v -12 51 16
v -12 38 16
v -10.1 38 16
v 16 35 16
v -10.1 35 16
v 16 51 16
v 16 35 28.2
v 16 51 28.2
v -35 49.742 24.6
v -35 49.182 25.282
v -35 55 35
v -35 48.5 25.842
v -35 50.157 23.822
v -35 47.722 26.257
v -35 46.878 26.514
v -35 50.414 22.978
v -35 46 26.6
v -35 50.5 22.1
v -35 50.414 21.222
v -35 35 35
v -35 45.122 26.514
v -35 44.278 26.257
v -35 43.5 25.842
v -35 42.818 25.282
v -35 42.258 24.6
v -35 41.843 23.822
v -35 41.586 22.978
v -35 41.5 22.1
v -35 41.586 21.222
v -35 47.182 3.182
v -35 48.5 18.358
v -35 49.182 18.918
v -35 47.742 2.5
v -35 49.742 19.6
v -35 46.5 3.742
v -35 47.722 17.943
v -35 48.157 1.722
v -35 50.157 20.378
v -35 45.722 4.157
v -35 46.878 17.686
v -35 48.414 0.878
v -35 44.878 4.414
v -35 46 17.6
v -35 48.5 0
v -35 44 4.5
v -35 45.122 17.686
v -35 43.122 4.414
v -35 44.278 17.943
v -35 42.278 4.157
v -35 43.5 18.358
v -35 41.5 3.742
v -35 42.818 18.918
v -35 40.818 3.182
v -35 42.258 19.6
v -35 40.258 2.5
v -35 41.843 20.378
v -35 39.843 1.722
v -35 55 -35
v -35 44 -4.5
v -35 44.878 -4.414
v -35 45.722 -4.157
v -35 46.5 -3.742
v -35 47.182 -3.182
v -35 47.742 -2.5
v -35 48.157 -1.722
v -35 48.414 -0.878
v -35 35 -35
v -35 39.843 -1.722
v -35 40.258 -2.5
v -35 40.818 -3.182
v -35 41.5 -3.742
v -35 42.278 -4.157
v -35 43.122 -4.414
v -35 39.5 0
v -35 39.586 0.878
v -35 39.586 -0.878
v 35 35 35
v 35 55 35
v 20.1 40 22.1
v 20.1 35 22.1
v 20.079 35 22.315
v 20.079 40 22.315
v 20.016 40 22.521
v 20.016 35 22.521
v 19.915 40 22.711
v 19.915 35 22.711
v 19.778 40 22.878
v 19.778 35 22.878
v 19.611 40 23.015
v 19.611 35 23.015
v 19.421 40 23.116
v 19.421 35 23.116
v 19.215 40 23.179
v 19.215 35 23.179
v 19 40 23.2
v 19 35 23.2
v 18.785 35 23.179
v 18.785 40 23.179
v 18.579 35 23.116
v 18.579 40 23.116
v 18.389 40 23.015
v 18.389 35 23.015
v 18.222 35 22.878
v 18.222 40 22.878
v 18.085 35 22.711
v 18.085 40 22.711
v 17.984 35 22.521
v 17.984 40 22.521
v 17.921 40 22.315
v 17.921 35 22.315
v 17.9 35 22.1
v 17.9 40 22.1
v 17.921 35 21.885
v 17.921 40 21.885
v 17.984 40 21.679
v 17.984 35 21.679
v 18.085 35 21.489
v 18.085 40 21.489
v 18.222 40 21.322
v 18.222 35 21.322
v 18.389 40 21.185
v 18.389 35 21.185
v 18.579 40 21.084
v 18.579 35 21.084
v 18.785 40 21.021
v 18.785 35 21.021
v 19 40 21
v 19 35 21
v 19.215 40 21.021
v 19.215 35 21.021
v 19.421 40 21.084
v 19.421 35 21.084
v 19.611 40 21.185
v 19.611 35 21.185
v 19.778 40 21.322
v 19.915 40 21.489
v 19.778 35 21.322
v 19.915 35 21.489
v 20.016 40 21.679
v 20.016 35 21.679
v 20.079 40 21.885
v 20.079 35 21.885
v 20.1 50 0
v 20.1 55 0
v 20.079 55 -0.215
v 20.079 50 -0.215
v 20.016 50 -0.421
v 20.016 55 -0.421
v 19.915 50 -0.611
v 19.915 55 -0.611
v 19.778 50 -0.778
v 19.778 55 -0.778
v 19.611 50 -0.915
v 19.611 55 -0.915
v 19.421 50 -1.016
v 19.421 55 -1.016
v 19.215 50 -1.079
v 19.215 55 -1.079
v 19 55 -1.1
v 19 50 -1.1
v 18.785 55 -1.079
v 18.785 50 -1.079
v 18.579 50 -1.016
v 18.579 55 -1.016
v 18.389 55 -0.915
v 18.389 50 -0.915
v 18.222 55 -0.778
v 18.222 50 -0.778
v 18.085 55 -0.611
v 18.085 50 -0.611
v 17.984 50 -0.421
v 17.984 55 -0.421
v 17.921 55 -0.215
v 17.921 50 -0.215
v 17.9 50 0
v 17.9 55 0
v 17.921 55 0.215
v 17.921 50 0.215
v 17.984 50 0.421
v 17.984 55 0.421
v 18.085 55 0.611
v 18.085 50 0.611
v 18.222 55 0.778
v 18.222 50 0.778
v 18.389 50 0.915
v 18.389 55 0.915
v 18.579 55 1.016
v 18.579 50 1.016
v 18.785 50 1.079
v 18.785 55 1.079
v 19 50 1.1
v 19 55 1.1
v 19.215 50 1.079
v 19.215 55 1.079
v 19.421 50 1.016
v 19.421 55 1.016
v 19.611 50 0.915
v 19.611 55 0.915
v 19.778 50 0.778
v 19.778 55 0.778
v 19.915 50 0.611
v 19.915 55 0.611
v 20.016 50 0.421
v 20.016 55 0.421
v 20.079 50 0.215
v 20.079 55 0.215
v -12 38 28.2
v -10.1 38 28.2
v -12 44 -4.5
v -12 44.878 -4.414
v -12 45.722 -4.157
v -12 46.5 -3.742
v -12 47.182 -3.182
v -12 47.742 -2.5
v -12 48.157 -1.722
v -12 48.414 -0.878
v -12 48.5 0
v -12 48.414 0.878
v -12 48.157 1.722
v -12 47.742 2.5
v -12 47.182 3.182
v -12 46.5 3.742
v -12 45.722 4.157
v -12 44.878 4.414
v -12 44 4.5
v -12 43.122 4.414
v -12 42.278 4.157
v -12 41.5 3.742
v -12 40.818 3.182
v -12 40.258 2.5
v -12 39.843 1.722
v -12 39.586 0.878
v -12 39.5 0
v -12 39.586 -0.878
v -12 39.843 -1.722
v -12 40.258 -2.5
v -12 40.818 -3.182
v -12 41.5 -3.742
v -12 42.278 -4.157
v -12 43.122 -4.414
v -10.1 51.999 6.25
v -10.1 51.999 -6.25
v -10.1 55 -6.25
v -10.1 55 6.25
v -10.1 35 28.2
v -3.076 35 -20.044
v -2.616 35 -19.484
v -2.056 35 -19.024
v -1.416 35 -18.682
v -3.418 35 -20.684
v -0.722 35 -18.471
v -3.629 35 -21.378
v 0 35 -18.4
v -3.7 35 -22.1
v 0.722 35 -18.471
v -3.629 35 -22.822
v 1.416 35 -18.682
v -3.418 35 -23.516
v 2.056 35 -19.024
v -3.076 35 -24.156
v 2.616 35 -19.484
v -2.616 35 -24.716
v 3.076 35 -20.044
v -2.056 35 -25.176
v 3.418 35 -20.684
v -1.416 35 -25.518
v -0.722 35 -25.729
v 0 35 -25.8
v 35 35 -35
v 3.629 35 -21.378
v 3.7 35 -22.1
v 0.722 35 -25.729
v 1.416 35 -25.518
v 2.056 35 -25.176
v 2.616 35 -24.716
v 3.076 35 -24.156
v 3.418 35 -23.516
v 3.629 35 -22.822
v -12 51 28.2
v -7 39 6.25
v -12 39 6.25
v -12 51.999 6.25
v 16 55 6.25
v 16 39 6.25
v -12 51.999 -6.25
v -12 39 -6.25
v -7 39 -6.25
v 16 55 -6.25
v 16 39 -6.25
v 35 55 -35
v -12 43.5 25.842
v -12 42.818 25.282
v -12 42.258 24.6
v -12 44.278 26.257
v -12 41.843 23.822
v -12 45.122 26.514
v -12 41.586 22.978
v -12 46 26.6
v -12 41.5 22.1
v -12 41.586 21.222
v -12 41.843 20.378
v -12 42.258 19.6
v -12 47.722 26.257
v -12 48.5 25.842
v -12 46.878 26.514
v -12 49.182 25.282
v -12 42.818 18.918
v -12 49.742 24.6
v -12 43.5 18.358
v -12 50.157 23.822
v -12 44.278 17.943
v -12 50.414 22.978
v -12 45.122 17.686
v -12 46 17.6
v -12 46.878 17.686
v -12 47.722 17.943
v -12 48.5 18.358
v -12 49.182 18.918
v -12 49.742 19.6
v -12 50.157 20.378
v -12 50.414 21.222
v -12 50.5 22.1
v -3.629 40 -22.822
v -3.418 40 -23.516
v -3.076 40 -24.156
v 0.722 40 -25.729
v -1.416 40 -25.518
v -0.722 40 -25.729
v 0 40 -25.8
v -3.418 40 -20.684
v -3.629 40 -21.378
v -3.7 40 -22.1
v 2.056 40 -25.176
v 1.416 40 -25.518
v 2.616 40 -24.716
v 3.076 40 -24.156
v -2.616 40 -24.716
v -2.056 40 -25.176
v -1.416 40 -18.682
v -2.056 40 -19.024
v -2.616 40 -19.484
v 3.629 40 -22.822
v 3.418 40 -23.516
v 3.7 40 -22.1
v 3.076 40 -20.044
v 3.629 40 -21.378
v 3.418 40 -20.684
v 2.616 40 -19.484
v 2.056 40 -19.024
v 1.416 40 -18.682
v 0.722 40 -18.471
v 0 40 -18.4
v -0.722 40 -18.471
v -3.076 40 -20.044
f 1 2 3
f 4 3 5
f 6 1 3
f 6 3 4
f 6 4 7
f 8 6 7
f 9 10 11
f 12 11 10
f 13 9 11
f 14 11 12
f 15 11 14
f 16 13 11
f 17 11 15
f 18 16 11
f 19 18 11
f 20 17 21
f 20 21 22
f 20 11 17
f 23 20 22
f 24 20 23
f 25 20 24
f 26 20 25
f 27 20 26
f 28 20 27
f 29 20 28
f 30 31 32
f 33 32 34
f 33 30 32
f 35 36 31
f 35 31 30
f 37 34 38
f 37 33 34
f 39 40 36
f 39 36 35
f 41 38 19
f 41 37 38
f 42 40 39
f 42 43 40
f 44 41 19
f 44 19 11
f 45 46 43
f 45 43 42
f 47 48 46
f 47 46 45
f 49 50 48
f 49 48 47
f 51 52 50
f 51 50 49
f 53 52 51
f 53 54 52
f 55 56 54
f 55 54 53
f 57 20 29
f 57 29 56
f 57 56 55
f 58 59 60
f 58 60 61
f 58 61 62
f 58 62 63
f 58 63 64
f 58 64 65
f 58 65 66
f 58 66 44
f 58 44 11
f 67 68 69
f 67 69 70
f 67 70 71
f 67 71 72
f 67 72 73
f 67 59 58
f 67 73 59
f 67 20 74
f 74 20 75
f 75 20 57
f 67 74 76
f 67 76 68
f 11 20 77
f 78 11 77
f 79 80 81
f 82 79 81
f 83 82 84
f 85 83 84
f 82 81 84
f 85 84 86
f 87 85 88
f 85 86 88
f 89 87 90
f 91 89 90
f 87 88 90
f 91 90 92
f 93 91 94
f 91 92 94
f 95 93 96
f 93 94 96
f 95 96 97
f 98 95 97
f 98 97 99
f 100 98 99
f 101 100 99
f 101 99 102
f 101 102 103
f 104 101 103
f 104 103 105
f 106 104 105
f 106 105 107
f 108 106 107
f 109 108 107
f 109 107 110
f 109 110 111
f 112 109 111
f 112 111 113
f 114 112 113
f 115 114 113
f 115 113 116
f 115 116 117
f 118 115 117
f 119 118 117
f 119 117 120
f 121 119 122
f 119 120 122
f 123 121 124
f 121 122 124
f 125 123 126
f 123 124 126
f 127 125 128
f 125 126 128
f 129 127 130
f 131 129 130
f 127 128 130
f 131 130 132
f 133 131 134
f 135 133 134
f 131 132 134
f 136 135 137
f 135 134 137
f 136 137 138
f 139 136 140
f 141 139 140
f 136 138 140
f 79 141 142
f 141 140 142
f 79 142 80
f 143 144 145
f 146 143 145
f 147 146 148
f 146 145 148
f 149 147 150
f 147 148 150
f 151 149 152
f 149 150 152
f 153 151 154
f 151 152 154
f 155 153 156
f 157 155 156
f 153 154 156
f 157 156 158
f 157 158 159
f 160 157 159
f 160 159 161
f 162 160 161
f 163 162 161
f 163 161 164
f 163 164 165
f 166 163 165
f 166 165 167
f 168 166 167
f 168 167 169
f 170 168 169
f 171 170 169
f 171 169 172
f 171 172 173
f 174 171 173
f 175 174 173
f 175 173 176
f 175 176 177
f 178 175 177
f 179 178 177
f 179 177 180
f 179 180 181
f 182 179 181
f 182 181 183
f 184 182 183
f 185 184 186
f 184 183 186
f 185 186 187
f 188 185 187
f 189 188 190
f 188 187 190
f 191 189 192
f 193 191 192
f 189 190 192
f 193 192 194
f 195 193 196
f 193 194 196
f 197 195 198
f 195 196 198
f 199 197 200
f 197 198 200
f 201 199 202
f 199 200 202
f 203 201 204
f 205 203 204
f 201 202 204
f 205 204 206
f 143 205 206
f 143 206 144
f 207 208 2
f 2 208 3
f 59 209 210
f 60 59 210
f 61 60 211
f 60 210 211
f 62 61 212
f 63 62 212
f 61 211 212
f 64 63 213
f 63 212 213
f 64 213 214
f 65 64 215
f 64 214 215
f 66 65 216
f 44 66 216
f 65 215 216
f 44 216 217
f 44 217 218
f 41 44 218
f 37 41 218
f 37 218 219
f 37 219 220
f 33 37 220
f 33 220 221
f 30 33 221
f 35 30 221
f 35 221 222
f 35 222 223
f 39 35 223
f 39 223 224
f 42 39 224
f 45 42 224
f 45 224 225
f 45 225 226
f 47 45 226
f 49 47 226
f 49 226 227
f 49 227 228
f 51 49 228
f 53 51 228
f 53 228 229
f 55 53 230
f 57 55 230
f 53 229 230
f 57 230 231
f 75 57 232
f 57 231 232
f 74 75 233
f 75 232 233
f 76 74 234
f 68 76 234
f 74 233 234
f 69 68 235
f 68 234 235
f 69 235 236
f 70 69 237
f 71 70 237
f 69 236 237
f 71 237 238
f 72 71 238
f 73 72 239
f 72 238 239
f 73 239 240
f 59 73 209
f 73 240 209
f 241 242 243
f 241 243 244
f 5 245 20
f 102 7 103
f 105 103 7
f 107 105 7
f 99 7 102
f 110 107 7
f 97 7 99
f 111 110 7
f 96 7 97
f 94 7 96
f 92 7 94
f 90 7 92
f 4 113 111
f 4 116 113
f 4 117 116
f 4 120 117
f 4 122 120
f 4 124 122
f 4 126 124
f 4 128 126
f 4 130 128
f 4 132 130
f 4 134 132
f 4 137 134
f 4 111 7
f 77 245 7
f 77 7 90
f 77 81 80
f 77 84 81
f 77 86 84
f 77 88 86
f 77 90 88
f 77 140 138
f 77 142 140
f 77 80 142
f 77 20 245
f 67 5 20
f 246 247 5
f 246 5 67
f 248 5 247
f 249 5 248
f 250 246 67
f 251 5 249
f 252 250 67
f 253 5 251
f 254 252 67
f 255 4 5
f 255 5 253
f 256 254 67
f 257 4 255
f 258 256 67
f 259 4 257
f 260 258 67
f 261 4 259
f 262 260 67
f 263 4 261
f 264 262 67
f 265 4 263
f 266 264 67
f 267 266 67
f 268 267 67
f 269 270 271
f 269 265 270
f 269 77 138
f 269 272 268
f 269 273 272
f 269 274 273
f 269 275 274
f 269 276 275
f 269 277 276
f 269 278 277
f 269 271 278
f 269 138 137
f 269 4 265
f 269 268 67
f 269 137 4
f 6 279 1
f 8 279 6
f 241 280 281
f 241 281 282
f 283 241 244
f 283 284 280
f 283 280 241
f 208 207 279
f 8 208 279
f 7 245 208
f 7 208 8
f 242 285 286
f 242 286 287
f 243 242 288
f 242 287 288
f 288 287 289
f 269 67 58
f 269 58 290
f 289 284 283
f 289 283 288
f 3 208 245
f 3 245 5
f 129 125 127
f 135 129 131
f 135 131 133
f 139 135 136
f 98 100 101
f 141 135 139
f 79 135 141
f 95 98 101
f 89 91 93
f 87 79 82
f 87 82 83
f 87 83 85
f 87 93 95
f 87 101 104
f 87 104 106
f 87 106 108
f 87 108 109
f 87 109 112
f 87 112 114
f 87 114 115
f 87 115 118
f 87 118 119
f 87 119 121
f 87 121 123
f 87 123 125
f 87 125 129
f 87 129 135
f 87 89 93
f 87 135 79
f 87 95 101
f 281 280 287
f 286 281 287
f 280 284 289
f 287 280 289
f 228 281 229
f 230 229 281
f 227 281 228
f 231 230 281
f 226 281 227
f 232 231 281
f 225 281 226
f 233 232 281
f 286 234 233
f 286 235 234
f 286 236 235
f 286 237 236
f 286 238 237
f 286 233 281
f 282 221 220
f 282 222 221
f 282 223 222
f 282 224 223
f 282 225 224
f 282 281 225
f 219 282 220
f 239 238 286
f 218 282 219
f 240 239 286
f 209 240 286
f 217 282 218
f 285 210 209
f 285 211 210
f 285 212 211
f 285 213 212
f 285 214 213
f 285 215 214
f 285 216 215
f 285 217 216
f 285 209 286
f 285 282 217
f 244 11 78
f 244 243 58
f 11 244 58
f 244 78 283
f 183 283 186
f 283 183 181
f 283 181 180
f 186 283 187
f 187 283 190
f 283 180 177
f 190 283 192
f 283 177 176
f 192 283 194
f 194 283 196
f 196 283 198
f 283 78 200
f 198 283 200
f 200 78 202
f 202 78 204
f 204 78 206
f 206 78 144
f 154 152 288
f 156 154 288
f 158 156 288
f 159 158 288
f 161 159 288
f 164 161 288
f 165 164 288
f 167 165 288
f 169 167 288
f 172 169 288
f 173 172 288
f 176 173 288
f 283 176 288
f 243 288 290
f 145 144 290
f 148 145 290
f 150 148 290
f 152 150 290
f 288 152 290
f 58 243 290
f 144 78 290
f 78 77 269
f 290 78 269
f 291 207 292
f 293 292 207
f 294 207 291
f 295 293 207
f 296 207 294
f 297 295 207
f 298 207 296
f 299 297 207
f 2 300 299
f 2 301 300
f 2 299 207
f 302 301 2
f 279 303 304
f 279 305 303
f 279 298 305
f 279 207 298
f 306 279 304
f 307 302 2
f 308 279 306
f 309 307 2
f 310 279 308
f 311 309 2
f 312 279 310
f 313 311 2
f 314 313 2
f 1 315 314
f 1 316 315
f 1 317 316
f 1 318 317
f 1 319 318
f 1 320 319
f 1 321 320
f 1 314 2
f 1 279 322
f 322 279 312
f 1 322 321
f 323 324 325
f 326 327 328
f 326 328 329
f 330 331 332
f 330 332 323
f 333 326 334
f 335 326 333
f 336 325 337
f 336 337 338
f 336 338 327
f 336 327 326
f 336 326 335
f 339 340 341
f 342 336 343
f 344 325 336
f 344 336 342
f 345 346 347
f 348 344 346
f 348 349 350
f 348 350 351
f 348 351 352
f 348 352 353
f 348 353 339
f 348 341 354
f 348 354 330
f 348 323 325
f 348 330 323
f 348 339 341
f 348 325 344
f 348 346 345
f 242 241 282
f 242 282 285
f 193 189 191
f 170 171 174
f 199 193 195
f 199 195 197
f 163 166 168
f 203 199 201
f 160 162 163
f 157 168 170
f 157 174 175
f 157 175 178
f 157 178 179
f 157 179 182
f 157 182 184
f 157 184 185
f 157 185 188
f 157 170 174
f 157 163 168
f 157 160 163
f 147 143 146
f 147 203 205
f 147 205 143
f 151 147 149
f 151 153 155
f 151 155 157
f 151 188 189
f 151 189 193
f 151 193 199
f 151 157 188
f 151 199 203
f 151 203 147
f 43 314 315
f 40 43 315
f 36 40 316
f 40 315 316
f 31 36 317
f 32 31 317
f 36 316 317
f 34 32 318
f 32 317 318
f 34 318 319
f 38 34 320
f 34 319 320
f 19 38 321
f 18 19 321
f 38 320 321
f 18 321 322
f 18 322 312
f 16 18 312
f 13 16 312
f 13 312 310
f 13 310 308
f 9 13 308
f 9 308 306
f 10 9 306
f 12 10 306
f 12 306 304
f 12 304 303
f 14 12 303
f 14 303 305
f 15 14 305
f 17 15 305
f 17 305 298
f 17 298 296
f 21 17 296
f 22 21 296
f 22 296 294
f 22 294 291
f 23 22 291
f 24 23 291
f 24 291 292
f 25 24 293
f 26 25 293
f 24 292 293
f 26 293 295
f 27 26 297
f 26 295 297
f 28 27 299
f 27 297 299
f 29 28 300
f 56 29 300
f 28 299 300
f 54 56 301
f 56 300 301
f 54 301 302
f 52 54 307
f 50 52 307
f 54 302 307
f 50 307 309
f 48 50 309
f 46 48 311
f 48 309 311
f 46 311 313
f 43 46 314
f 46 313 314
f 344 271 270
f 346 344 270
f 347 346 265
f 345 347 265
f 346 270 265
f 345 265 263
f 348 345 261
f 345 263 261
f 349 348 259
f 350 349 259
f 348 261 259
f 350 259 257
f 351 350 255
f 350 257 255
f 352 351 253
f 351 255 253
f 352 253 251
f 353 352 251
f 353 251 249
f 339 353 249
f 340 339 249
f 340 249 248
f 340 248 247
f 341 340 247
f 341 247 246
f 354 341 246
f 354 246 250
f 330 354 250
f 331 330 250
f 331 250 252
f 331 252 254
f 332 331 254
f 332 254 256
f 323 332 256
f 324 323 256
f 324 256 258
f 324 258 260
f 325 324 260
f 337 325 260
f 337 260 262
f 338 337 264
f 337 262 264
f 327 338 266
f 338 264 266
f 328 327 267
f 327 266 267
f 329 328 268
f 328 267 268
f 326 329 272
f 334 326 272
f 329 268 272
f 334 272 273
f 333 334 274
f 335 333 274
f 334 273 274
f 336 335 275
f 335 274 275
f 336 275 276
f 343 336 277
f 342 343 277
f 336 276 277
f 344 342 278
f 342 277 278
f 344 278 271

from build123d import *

# Parameters (mm, degrees)
CROQUIS1_W              = 64
CROQUIS1_H              = 64
SALIENTE_EXTRUIR1_DEPTH = 60
CROQUIS2_W              = 70
CROQUIS2_H              = 70
CROQUIS2_W_2            = 64
CROQUIS2_H_2            = 64
SALIENTE_EXTRUIR2_DEPTH = 64
CORTAR_EXTRUIR1_DEPTH   = 21
CROQUIS5_R              = 1.1
CORTAR_EXTRUIR2_DEPTH   = 10
CORTAR_EXTRUIR3_REACH   = 30
CROQUIS10_R             = 4.5
CROQUIS11_W             = 70
CROQUIS11_H             = 70
CORTAR_EXTRUIR4_DEPTH   = 30
CROQUIS12_W             = 23
CROQUIS12_H             = 12.2
CORTAR_EXTRUIR5_DEPTH   = 21
CORTAR_EXTRUIR6_REACH   = 30
CROQUIS13_R             = 4.5
CROQUIS14_R             = 1.1
CORTAR_EXTRUIR7_DEPTH   = 10
CROQUIS15_R             = 3.7
CORTAR_EXTRUIR8_DEPTH   = 10
CROQUIS16_W             = 64
CROQUIS16_H             = 64
CORTAR_EXTRUIR9_DEPTH   = 5
CROQUIS17_W             = 12.5
CROQUIS17_H             = 12.998685397
CORTAR_EXTRUIR10_DEPTH  = 5
CORTAR_EXTRUIR11_REACH  = 72
CROQUIS18_W             = 70
CROQUIS18_H             = 9
CROQUIS18_H_2           = 5.000169364
CORTAR_EXTRUIR13_DEPTH  = 5
CORTAR_EXTRUIR16_REACH  = 5.001
CROQUIS23_W             = 3.1
CROQUIS23_H             = 12.5
CORTAR_EXTRUIR17_REACH  = 5
CROQUIS22_W             = 3.1
CROQUIS22_H             = 12.2


with BuildPart() as part:
    # Croquis1 → Saliente-Extruir1 (new body)
    with BuildSketch(Plane(origin=(0, 0, 0), x_dir=(1, 0, 0), z_dir=(0, 1, 0))):
        Rectangle(CROQUIS1_W, CROQUIS1_H)
    extrude(amount=SALIENTE_EXTRUIR1_DEPTH)

    # Croquis2 → Saliente-Extruir2 (add)
    with BuildSketch(Plane(origin=(0, 0, 0), x_dir=(1, 0, 0), z_dir=(0, 1, 0))):
        Rectangle(CROQUIS2_W, CROQUIS2_H)
        Rectangle(CROQUIS2_W_2, CROQUIS2_H_2, mode=Mode.SUBTRACT)
    extrude(amount=SALIENTE_EXTRUIR2_DEPTH)

    # Croquis4 → Cortar-Extruir1 (cut)
    with BuildSketch(Plane(origin=(0, 60, 0), x_dir=(1, 0, 0), z_dir=(0, 1, 0))):
        Polygon((-7, 6), (-7, -6), (-7, -6.25), (16, -6.25), (16, -6), (16, 6), (16, 6.25), (-7, 6.25), align=None)
    extrude(amount=-CORTAR_EXTRUIR1_DEPTH, mode=Mode.SUBTRACT)

    # Croquis5 → Cortar-Extruir2 (cut)
    with BuildSketch(Plane(origin=(0, 60, 0), x_dir=(1, 0, 0), z_dir=(0, 1, 0))):
        with Locations((19, 0)):
            Circle(CROQUIS5_R)
        with Locations((-9, 0)):
            Circle(CROQUIS5_R)
    extrude(amount=-CORTAR_EXTRUIR2_DEPTH, mode=Mode.SUBTRACT)

    # Croquis10 → Cortar-Extruir3 (cut, up to next)
    with BuildSketch(Plane(origin=(-7, 0, 0), x_dir=(0, 0, -1), z_dir=(1, 0, 0)), mode=Mode.PRIVATE) as cortar_extruir3_sk1:
        with Locations((0, 44)):
            Circle(CROQUIS10_R)
    cortar_extruir3_tool1 = extrude(cortar_extruir3_sk1.sketch, amount=-CORTAR_EXTRUIR3_REACH, mode=Mode.PRIVATE) & part.part
    add(cortar_extruir3_tool1.solids().sort_by_distance((-7, 44, 0))[0], mode=Mode.SUBTRACT)

    # Croquis11 → Cortar-Extruir4 (cut)
    with BuildSketch(Plane.XZ):
        Rectangle(CROQUIS11_W, CROQUIS11_H)
    extrude(amount=-CORTAR_EXTRUIR4_DEPTH, mode=Mode.SUBTRACT)

    # Croquis12 → Cortar-Extruir5 (cut)
    with BuildSketch(Plane.XZ.offset(-30)):
        with Locations((4.5, 22.1)):
            Rectangle(CROQUIS12_W, CROQUIS12_H)
    extrude(amount=-CORTAR_EXTRUIR5_DEPTH, mode=Mode.SUBTRACT)

    # Croquis13 → Cortar-Extruir6 (cut, up to next)
    with BuildSketch(Plane(origin=(-7, 0, 0), x_dir=(0, 0, -1), z_dir=(1, 0, 0)), mode=Mode.PRIVATE) as cortar_extruir6_sk1:
        with Locations((-22.1, 46)):
            Circle(CROQUIS13_R)
    cortar_extruir6_tool1 = extrude(cortar_extruir6_sk1.sketch, amount=-CORTAR_EXTRUIR6_REACH, mode=Mode.PRIVATE) & part.part
    add(cortar_extruir6_tool1.solids().sort_by_distance((-7, 46, 22.1))[0], mode=Mode.SUBTRACT)

    # Croquis14 → Cortar-Extruir7 (cut)
    with BuildSketch(Plane.XZ.offset(-30)):
        with Locations((19, 22.1)):
            Circle(CROQUIS14_R)
        with Locations((-9, 22.1)):
            Circle(CROQUIS14_R)
    extrude(amount=-CORTAR_EXTRUIR7_DEPTH, mode=Mode.SUBTRACT)

    # Croquis15 → Cortar-Extruir8 (cut)
    with BuildSketch(Plane.XZ.offset(-30)):
        with Locations((0, -22.1)):
            Circle(CROQUIS15_R)
    extrude(amount=-CORTAR_EXTRUIR8_DEPTH, mode=Mode.SUBTRACT)

    # Croquis16 → Cortar-Extruir9 (cut)
    with BuildSketch(Plane(origin=(0, 60, 0), x_dir=(1, 0, 0), z_dir=(0, 1, 0))):
        Rectangle(CROQUIS16_W, CROQUIS16_H)
    extrude(amount=-CORTAR_EXTRUIR9_DEPTH, mode=Mode.SUBTRACT)

    # Croquis17 → Cortar-Extruir10 (cut)
    with BuildSketch(Plane(origin=(-7, 0, 0), x_dir=(0, 0, -1), z_dir=(1, 0, 0))):
        with Locations((0, 45.499342699)):
            Rectangle(CROQUIS17_W, CROQUIS17_H)
    extrude(amount=-CORTAR_EXTRUIR10_DEPTH, mode=Mode.SUBTRACT)

    # Croquis18 → Cortar-Extruir11 (cut, up to next)
    with BuildSketch(Plane(origin=(35, 0, 0), x_dir=(0, 0, -1), z_dir=(1, 0, 0)), mode=Mode.PRIVATE) as cortar_extruir11_sk1:
        with Locations((0, 59.5)):
            Rectangle(CROQUIS18_W, CROQUIS18_H)
    cortar_extruir11_tool1 = extrude(cortar_extruir11_sk1.sketch, amount=-CORTAR_EXTRUIR11_REACH, mode=Mode.PRIVATE) & part.part
    add(cortar_extruir11_tool1.solids().sort_by_distance((35, 59.5, 0))[0], mode=Mode.SUBTRACT)
    # Croquis18 → Cortar-Extruir11 (cut, up to next)
    with BuildSketch(Plane(origin=(35, 0, 0), x_dir=(0, 0, -1), z_dir=(1, 0, 0)), mode=Mode.PRIVATE) as cortar_extruir11_sk2:
        with Locations((0, 32.500084682)):
            Rectangle(CROQUIS18_W, CROQUIS18_H_2)
    cortar_extruir11_tool2 = extrude(cortar_extruir11_sk2.sketch, amount=-CORTAR_EXTRUIR11_REACH, mode=Mode.PRIVATE) & part.part
    add(cortar_extruir11_tool2.solids().sort_by_distance((35, 32.500085, 0))[0], mode=Mode.SUBTRACT)

    # Croquis19 → Cortar-Extruir13 (cut)
    with BuildSketch(Plane(origin=(-7, 0, 0), x_dir=(0, 0, -1), z_dir=(1, 0, 0))):
        Polygon((-16, 51), (-28.2, 51), (-28.2, 38.000169364), (-22.1, 38.000169364), (-16, 38.000169364), align=None)
    extrude(amount=-CORTAR_EXTRUIR13_DEPTH, mode=Mode.SUBTRACT)

    # Croquis23 → Cortar-Extruir16 (cut, up to next)
    with BuildSketch(Plane.XZ.offset(-51.998685397), mode=Mode.PRIVATE) as cortar_extruir16_sk1:
        with Locations((-8.55, 0)):
            Rectangle(CROQUIS23_W, CROQUIS23_H)
    cortar_extruir16_tool1 = extrude(cortar_extruir16_sk1.sketch, amount=-CORTAR_EXTRUIR16_REACH, mode=Mode.PRIVATE) & part.part
    add(cortar_extruir16_tool1.solids().sort_by_distance((-8.55, 51.998685, 0))[0], mode=Mode.SUBTRACT)

    # Croquis22 → Cortar-Extruir17 (cut, up to next)
    with BuildSketch(Plane(origin=(0, 38.000169364, 0), x_dir=(1, 0, 0), z_dir=(0, 1, 0)), mode=Mode.PRIVATE) as cortar_extruir17_sk1:
        with Locations((-8.55, -22.1)):
            Rectangle(CROQUIS22_W, CROQUIS22_H)
    cortar_extruir17_tool1 = extrude(cortar_extruir17_sk1.sketch, amount=-CORTAR_EXTRUIR17_REACH, mode=Mode.PRIVATE) & part.part
    add(cortar_extruir17_tool1.solids().sort_by_distance((-8.55, 38.000169, 22.1))[0], mode=Mode.SUBTRACT)


solid = part.part
